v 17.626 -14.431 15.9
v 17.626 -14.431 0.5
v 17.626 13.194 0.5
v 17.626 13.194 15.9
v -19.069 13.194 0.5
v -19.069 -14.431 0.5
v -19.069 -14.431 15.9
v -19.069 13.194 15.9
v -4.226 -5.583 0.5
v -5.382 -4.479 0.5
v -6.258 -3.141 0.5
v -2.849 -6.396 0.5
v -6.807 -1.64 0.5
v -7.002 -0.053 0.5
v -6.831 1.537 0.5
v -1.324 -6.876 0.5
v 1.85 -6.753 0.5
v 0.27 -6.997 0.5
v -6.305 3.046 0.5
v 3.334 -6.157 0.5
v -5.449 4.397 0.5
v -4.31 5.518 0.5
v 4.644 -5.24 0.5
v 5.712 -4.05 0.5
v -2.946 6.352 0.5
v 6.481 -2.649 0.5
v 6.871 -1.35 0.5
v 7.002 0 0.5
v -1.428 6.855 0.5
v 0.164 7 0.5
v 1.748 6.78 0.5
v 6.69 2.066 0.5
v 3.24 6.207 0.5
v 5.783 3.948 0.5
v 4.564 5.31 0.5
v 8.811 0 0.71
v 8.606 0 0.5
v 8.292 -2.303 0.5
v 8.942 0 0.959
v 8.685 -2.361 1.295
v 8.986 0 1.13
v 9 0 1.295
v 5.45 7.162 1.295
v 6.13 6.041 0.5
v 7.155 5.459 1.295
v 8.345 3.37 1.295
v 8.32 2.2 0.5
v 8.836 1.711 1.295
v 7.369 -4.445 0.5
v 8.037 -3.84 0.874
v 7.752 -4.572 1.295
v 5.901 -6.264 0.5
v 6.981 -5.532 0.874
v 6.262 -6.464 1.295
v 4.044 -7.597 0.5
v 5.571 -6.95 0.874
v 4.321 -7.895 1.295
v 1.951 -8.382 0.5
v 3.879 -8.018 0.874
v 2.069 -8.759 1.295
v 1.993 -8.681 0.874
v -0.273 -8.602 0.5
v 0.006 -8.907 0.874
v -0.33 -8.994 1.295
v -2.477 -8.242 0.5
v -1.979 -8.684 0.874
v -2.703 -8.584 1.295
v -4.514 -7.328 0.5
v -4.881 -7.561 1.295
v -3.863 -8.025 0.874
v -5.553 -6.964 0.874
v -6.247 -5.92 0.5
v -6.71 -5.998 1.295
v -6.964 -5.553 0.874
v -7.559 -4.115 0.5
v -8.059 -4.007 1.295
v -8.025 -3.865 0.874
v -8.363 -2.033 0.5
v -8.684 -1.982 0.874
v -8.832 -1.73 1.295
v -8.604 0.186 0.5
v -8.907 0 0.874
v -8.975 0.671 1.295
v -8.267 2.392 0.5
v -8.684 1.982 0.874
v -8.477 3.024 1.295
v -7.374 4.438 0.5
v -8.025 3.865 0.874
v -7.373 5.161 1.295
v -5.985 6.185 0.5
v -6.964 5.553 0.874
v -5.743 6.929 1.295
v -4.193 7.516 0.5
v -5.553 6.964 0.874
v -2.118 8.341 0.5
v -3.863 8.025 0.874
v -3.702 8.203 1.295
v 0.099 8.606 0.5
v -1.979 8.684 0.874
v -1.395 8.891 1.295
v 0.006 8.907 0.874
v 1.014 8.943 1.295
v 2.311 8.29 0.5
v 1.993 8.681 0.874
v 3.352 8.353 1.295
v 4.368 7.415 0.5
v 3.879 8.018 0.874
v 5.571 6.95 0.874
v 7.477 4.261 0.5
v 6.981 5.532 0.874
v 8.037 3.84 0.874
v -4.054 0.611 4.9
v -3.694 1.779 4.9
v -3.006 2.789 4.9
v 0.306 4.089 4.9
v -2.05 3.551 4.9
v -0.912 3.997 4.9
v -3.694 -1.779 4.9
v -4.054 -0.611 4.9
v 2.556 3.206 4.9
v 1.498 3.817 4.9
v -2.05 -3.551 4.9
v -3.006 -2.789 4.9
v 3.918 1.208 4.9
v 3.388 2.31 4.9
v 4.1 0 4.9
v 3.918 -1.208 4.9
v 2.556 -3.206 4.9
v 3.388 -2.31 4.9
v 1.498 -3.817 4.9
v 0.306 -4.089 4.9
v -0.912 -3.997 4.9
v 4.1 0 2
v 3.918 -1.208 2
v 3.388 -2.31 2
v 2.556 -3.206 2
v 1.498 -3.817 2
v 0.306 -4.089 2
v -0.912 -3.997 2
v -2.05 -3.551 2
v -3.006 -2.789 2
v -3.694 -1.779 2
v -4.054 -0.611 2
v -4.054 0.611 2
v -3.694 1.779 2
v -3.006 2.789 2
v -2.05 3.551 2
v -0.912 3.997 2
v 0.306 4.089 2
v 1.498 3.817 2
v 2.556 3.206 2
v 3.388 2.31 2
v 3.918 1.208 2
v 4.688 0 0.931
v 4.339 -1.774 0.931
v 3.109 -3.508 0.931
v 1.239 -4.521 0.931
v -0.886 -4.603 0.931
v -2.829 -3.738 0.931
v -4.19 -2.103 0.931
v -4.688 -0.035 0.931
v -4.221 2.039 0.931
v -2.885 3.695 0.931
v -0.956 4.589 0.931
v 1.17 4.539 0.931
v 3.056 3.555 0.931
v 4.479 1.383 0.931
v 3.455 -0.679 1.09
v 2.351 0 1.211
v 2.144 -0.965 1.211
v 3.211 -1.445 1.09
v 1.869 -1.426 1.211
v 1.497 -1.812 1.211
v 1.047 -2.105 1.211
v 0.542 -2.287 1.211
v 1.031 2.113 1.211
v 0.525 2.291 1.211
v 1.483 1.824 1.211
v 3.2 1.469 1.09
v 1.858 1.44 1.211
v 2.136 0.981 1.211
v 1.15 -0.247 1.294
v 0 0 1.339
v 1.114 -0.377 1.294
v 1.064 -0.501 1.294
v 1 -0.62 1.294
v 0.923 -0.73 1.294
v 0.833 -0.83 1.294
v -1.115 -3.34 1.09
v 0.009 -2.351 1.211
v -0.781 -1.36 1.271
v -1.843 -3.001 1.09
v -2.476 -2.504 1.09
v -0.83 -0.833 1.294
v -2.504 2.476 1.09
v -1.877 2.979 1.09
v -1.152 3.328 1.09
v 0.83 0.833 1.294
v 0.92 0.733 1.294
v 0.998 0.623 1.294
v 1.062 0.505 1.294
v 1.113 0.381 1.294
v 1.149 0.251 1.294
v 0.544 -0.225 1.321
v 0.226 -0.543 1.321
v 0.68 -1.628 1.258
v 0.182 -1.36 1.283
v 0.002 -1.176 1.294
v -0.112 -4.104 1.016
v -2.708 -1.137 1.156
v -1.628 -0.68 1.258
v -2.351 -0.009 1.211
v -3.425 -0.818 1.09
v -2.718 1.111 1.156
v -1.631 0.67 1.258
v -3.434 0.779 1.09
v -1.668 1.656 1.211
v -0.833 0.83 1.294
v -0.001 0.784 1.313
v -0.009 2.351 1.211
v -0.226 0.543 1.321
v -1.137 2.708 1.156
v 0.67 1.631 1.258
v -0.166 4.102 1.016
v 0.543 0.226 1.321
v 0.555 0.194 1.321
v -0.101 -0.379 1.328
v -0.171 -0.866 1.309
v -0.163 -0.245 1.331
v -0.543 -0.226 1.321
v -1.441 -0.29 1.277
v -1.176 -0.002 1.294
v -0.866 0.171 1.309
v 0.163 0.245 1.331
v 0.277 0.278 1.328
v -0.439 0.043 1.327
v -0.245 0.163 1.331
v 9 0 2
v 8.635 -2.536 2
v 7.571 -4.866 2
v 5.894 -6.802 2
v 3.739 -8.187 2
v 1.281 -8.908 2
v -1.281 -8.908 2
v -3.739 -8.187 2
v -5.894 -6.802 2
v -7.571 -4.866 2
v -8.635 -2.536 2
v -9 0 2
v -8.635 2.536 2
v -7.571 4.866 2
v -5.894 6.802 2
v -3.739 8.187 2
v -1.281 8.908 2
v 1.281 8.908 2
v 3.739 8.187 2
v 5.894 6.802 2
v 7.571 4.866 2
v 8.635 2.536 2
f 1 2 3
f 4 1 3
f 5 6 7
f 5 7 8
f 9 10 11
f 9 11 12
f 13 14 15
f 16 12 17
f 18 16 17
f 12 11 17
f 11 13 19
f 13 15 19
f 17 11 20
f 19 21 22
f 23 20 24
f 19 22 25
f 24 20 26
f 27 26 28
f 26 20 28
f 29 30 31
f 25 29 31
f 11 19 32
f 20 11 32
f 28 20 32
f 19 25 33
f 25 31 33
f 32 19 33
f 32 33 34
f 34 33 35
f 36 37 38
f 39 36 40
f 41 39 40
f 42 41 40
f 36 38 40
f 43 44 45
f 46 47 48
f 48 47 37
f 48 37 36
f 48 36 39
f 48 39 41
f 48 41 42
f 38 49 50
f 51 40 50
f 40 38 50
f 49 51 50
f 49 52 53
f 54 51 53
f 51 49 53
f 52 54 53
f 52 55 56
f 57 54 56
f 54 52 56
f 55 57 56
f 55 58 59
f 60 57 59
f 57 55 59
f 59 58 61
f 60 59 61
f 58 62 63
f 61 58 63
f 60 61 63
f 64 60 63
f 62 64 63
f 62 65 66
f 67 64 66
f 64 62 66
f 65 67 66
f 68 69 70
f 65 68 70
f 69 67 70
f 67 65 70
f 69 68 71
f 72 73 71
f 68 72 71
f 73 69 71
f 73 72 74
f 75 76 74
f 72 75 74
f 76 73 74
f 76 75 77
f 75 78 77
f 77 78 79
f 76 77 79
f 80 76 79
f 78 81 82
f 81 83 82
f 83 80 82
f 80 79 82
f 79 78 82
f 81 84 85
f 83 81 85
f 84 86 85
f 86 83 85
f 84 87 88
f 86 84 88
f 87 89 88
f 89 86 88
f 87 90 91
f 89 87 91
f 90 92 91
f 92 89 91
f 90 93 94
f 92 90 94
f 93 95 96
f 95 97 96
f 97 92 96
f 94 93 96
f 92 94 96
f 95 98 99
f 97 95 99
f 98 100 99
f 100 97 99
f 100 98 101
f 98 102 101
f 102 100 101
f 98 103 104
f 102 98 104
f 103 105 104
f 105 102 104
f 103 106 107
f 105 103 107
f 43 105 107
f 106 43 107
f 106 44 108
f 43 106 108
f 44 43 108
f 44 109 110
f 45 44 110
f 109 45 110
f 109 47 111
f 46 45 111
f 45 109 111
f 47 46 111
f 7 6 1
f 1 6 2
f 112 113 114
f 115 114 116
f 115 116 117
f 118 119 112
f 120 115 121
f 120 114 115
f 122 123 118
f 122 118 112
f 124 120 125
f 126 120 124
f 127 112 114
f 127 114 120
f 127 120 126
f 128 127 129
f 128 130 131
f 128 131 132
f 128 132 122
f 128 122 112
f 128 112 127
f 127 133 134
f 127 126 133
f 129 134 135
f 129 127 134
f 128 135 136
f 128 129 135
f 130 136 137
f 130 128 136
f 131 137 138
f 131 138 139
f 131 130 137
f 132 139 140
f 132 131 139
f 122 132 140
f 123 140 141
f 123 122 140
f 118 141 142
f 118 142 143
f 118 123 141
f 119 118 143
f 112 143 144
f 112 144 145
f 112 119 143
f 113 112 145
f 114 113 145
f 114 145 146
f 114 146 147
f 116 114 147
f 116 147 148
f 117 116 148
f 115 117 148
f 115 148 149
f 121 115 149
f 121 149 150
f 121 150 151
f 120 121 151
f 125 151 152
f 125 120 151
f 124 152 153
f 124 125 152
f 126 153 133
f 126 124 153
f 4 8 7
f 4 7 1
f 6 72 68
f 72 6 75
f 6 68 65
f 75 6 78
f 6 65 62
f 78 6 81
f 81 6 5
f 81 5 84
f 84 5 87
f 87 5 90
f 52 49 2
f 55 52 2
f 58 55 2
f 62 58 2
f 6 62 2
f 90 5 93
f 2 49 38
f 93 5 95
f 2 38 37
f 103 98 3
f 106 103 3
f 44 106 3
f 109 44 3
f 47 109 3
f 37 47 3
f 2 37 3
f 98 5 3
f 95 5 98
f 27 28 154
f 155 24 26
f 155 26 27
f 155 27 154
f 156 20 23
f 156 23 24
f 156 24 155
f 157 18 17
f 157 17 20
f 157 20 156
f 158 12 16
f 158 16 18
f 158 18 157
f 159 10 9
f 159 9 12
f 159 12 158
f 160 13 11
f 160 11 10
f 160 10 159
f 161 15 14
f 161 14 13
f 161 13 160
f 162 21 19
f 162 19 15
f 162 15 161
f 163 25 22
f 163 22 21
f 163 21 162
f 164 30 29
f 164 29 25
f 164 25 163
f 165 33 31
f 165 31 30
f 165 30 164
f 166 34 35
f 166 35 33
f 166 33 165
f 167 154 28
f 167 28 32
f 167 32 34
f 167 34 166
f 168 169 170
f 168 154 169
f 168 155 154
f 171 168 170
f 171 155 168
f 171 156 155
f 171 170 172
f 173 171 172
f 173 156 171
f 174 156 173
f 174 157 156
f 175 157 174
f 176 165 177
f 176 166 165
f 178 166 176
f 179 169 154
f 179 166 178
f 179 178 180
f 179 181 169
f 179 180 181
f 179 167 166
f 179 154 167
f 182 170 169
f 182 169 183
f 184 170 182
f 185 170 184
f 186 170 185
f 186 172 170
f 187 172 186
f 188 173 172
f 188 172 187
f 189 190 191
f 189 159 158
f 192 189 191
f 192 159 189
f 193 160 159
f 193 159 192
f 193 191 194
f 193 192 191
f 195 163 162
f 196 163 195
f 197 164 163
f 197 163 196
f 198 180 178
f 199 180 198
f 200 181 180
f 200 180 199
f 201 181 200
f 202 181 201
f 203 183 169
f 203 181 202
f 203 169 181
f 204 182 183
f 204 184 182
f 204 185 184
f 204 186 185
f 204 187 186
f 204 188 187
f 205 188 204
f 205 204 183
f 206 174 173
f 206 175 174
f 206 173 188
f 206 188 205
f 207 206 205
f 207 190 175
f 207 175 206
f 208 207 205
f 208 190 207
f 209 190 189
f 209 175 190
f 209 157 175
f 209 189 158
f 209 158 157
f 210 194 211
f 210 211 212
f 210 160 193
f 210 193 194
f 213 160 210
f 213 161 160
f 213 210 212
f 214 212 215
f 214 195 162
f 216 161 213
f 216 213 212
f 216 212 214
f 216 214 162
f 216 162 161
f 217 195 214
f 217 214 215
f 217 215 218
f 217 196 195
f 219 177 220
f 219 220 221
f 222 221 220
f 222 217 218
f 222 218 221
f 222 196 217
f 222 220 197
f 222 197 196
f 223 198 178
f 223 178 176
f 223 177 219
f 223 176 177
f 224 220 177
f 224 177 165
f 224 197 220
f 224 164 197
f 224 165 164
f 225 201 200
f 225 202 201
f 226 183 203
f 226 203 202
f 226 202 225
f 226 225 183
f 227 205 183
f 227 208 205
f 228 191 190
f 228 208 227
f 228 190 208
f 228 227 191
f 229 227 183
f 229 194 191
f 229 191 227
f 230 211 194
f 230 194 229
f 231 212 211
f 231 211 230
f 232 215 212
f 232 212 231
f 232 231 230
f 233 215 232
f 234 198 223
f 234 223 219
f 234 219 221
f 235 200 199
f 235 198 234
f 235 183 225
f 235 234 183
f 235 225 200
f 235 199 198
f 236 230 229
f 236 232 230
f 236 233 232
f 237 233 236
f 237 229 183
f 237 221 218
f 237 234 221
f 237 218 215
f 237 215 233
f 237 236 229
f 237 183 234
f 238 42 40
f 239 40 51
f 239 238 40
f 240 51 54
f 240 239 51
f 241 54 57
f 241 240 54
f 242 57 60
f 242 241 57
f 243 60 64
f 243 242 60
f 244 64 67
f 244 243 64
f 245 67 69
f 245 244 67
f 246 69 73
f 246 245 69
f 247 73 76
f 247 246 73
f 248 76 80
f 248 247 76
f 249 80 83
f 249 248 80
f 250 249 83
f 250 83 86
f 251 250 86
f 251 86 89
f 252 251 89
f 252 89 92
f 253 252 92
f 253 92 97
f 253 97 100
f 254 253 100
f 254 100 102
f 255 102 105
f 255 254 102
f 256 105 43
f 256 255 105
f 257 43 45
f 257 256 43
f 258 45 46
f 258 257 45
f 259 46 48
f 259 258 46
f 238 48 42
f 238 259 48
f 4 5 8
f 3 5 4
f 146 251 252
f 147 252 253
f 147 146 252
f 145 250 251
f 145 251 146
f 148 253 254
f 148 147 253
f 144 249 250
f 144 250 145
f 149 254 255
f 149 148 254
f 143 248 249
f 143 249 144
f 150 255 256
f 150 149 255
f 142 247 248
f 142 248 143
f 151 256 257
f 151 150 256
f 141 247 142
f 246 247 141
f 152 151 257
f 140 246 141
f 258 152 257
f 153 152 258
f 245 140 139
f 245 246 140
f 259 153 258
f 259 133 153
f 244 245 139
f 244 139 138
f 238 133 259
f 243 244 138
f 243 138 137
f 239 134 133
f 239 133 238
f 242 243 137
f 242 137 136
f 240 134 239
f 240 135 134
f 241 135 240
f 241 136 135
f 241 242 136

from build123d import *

# Parameters (mm, degrees)
F2_R     = 1
F4_W     = 36.695028
F4_H     = 27.624347
F5_DEPTH = 15.4


with BuildPart() as f1:
    # F0 (on Front) → F1 (revolve)
    with BuildSketch(Plane.XZ):
        with BuildLine():
            ThreePointArc((0, 1.33886), (4.542224, 0.953262), (9, 0))
            Line((9, 0), (9, 2))
            Line((9, 2), (4.1, 2))
            Line((4.1, 2), (4.1, 4.9))
            Line((4.1, 4.9), (0, 4.9))
            Line((0, 4.9), (0, 1.33886))
        make_face()
    revolve(axis=Axis((0, 0, 3.11943), (0, 0, -1)))

    # F2
    f2_edges = [f1.edges().sort_by_distance(p)[0] for p in [
        (-9, 0, 0),
    ]]
    fillet(f2_edges, radius=F2_R)


with BuildPart() as f5:
    # F4 (on offset) → F5 (new body)
    with BuildSketch(Plane.XY.offset(0.5)):
        with Locations((-0.721532, -0.618456)):
            Rectangle(F4_W, F4_H)
    extrude(amount=F5_DEPTH)

    # F6: cut F1
    add(f1.part, mode=Mode.SUBTRACT)


solid = f5.part
